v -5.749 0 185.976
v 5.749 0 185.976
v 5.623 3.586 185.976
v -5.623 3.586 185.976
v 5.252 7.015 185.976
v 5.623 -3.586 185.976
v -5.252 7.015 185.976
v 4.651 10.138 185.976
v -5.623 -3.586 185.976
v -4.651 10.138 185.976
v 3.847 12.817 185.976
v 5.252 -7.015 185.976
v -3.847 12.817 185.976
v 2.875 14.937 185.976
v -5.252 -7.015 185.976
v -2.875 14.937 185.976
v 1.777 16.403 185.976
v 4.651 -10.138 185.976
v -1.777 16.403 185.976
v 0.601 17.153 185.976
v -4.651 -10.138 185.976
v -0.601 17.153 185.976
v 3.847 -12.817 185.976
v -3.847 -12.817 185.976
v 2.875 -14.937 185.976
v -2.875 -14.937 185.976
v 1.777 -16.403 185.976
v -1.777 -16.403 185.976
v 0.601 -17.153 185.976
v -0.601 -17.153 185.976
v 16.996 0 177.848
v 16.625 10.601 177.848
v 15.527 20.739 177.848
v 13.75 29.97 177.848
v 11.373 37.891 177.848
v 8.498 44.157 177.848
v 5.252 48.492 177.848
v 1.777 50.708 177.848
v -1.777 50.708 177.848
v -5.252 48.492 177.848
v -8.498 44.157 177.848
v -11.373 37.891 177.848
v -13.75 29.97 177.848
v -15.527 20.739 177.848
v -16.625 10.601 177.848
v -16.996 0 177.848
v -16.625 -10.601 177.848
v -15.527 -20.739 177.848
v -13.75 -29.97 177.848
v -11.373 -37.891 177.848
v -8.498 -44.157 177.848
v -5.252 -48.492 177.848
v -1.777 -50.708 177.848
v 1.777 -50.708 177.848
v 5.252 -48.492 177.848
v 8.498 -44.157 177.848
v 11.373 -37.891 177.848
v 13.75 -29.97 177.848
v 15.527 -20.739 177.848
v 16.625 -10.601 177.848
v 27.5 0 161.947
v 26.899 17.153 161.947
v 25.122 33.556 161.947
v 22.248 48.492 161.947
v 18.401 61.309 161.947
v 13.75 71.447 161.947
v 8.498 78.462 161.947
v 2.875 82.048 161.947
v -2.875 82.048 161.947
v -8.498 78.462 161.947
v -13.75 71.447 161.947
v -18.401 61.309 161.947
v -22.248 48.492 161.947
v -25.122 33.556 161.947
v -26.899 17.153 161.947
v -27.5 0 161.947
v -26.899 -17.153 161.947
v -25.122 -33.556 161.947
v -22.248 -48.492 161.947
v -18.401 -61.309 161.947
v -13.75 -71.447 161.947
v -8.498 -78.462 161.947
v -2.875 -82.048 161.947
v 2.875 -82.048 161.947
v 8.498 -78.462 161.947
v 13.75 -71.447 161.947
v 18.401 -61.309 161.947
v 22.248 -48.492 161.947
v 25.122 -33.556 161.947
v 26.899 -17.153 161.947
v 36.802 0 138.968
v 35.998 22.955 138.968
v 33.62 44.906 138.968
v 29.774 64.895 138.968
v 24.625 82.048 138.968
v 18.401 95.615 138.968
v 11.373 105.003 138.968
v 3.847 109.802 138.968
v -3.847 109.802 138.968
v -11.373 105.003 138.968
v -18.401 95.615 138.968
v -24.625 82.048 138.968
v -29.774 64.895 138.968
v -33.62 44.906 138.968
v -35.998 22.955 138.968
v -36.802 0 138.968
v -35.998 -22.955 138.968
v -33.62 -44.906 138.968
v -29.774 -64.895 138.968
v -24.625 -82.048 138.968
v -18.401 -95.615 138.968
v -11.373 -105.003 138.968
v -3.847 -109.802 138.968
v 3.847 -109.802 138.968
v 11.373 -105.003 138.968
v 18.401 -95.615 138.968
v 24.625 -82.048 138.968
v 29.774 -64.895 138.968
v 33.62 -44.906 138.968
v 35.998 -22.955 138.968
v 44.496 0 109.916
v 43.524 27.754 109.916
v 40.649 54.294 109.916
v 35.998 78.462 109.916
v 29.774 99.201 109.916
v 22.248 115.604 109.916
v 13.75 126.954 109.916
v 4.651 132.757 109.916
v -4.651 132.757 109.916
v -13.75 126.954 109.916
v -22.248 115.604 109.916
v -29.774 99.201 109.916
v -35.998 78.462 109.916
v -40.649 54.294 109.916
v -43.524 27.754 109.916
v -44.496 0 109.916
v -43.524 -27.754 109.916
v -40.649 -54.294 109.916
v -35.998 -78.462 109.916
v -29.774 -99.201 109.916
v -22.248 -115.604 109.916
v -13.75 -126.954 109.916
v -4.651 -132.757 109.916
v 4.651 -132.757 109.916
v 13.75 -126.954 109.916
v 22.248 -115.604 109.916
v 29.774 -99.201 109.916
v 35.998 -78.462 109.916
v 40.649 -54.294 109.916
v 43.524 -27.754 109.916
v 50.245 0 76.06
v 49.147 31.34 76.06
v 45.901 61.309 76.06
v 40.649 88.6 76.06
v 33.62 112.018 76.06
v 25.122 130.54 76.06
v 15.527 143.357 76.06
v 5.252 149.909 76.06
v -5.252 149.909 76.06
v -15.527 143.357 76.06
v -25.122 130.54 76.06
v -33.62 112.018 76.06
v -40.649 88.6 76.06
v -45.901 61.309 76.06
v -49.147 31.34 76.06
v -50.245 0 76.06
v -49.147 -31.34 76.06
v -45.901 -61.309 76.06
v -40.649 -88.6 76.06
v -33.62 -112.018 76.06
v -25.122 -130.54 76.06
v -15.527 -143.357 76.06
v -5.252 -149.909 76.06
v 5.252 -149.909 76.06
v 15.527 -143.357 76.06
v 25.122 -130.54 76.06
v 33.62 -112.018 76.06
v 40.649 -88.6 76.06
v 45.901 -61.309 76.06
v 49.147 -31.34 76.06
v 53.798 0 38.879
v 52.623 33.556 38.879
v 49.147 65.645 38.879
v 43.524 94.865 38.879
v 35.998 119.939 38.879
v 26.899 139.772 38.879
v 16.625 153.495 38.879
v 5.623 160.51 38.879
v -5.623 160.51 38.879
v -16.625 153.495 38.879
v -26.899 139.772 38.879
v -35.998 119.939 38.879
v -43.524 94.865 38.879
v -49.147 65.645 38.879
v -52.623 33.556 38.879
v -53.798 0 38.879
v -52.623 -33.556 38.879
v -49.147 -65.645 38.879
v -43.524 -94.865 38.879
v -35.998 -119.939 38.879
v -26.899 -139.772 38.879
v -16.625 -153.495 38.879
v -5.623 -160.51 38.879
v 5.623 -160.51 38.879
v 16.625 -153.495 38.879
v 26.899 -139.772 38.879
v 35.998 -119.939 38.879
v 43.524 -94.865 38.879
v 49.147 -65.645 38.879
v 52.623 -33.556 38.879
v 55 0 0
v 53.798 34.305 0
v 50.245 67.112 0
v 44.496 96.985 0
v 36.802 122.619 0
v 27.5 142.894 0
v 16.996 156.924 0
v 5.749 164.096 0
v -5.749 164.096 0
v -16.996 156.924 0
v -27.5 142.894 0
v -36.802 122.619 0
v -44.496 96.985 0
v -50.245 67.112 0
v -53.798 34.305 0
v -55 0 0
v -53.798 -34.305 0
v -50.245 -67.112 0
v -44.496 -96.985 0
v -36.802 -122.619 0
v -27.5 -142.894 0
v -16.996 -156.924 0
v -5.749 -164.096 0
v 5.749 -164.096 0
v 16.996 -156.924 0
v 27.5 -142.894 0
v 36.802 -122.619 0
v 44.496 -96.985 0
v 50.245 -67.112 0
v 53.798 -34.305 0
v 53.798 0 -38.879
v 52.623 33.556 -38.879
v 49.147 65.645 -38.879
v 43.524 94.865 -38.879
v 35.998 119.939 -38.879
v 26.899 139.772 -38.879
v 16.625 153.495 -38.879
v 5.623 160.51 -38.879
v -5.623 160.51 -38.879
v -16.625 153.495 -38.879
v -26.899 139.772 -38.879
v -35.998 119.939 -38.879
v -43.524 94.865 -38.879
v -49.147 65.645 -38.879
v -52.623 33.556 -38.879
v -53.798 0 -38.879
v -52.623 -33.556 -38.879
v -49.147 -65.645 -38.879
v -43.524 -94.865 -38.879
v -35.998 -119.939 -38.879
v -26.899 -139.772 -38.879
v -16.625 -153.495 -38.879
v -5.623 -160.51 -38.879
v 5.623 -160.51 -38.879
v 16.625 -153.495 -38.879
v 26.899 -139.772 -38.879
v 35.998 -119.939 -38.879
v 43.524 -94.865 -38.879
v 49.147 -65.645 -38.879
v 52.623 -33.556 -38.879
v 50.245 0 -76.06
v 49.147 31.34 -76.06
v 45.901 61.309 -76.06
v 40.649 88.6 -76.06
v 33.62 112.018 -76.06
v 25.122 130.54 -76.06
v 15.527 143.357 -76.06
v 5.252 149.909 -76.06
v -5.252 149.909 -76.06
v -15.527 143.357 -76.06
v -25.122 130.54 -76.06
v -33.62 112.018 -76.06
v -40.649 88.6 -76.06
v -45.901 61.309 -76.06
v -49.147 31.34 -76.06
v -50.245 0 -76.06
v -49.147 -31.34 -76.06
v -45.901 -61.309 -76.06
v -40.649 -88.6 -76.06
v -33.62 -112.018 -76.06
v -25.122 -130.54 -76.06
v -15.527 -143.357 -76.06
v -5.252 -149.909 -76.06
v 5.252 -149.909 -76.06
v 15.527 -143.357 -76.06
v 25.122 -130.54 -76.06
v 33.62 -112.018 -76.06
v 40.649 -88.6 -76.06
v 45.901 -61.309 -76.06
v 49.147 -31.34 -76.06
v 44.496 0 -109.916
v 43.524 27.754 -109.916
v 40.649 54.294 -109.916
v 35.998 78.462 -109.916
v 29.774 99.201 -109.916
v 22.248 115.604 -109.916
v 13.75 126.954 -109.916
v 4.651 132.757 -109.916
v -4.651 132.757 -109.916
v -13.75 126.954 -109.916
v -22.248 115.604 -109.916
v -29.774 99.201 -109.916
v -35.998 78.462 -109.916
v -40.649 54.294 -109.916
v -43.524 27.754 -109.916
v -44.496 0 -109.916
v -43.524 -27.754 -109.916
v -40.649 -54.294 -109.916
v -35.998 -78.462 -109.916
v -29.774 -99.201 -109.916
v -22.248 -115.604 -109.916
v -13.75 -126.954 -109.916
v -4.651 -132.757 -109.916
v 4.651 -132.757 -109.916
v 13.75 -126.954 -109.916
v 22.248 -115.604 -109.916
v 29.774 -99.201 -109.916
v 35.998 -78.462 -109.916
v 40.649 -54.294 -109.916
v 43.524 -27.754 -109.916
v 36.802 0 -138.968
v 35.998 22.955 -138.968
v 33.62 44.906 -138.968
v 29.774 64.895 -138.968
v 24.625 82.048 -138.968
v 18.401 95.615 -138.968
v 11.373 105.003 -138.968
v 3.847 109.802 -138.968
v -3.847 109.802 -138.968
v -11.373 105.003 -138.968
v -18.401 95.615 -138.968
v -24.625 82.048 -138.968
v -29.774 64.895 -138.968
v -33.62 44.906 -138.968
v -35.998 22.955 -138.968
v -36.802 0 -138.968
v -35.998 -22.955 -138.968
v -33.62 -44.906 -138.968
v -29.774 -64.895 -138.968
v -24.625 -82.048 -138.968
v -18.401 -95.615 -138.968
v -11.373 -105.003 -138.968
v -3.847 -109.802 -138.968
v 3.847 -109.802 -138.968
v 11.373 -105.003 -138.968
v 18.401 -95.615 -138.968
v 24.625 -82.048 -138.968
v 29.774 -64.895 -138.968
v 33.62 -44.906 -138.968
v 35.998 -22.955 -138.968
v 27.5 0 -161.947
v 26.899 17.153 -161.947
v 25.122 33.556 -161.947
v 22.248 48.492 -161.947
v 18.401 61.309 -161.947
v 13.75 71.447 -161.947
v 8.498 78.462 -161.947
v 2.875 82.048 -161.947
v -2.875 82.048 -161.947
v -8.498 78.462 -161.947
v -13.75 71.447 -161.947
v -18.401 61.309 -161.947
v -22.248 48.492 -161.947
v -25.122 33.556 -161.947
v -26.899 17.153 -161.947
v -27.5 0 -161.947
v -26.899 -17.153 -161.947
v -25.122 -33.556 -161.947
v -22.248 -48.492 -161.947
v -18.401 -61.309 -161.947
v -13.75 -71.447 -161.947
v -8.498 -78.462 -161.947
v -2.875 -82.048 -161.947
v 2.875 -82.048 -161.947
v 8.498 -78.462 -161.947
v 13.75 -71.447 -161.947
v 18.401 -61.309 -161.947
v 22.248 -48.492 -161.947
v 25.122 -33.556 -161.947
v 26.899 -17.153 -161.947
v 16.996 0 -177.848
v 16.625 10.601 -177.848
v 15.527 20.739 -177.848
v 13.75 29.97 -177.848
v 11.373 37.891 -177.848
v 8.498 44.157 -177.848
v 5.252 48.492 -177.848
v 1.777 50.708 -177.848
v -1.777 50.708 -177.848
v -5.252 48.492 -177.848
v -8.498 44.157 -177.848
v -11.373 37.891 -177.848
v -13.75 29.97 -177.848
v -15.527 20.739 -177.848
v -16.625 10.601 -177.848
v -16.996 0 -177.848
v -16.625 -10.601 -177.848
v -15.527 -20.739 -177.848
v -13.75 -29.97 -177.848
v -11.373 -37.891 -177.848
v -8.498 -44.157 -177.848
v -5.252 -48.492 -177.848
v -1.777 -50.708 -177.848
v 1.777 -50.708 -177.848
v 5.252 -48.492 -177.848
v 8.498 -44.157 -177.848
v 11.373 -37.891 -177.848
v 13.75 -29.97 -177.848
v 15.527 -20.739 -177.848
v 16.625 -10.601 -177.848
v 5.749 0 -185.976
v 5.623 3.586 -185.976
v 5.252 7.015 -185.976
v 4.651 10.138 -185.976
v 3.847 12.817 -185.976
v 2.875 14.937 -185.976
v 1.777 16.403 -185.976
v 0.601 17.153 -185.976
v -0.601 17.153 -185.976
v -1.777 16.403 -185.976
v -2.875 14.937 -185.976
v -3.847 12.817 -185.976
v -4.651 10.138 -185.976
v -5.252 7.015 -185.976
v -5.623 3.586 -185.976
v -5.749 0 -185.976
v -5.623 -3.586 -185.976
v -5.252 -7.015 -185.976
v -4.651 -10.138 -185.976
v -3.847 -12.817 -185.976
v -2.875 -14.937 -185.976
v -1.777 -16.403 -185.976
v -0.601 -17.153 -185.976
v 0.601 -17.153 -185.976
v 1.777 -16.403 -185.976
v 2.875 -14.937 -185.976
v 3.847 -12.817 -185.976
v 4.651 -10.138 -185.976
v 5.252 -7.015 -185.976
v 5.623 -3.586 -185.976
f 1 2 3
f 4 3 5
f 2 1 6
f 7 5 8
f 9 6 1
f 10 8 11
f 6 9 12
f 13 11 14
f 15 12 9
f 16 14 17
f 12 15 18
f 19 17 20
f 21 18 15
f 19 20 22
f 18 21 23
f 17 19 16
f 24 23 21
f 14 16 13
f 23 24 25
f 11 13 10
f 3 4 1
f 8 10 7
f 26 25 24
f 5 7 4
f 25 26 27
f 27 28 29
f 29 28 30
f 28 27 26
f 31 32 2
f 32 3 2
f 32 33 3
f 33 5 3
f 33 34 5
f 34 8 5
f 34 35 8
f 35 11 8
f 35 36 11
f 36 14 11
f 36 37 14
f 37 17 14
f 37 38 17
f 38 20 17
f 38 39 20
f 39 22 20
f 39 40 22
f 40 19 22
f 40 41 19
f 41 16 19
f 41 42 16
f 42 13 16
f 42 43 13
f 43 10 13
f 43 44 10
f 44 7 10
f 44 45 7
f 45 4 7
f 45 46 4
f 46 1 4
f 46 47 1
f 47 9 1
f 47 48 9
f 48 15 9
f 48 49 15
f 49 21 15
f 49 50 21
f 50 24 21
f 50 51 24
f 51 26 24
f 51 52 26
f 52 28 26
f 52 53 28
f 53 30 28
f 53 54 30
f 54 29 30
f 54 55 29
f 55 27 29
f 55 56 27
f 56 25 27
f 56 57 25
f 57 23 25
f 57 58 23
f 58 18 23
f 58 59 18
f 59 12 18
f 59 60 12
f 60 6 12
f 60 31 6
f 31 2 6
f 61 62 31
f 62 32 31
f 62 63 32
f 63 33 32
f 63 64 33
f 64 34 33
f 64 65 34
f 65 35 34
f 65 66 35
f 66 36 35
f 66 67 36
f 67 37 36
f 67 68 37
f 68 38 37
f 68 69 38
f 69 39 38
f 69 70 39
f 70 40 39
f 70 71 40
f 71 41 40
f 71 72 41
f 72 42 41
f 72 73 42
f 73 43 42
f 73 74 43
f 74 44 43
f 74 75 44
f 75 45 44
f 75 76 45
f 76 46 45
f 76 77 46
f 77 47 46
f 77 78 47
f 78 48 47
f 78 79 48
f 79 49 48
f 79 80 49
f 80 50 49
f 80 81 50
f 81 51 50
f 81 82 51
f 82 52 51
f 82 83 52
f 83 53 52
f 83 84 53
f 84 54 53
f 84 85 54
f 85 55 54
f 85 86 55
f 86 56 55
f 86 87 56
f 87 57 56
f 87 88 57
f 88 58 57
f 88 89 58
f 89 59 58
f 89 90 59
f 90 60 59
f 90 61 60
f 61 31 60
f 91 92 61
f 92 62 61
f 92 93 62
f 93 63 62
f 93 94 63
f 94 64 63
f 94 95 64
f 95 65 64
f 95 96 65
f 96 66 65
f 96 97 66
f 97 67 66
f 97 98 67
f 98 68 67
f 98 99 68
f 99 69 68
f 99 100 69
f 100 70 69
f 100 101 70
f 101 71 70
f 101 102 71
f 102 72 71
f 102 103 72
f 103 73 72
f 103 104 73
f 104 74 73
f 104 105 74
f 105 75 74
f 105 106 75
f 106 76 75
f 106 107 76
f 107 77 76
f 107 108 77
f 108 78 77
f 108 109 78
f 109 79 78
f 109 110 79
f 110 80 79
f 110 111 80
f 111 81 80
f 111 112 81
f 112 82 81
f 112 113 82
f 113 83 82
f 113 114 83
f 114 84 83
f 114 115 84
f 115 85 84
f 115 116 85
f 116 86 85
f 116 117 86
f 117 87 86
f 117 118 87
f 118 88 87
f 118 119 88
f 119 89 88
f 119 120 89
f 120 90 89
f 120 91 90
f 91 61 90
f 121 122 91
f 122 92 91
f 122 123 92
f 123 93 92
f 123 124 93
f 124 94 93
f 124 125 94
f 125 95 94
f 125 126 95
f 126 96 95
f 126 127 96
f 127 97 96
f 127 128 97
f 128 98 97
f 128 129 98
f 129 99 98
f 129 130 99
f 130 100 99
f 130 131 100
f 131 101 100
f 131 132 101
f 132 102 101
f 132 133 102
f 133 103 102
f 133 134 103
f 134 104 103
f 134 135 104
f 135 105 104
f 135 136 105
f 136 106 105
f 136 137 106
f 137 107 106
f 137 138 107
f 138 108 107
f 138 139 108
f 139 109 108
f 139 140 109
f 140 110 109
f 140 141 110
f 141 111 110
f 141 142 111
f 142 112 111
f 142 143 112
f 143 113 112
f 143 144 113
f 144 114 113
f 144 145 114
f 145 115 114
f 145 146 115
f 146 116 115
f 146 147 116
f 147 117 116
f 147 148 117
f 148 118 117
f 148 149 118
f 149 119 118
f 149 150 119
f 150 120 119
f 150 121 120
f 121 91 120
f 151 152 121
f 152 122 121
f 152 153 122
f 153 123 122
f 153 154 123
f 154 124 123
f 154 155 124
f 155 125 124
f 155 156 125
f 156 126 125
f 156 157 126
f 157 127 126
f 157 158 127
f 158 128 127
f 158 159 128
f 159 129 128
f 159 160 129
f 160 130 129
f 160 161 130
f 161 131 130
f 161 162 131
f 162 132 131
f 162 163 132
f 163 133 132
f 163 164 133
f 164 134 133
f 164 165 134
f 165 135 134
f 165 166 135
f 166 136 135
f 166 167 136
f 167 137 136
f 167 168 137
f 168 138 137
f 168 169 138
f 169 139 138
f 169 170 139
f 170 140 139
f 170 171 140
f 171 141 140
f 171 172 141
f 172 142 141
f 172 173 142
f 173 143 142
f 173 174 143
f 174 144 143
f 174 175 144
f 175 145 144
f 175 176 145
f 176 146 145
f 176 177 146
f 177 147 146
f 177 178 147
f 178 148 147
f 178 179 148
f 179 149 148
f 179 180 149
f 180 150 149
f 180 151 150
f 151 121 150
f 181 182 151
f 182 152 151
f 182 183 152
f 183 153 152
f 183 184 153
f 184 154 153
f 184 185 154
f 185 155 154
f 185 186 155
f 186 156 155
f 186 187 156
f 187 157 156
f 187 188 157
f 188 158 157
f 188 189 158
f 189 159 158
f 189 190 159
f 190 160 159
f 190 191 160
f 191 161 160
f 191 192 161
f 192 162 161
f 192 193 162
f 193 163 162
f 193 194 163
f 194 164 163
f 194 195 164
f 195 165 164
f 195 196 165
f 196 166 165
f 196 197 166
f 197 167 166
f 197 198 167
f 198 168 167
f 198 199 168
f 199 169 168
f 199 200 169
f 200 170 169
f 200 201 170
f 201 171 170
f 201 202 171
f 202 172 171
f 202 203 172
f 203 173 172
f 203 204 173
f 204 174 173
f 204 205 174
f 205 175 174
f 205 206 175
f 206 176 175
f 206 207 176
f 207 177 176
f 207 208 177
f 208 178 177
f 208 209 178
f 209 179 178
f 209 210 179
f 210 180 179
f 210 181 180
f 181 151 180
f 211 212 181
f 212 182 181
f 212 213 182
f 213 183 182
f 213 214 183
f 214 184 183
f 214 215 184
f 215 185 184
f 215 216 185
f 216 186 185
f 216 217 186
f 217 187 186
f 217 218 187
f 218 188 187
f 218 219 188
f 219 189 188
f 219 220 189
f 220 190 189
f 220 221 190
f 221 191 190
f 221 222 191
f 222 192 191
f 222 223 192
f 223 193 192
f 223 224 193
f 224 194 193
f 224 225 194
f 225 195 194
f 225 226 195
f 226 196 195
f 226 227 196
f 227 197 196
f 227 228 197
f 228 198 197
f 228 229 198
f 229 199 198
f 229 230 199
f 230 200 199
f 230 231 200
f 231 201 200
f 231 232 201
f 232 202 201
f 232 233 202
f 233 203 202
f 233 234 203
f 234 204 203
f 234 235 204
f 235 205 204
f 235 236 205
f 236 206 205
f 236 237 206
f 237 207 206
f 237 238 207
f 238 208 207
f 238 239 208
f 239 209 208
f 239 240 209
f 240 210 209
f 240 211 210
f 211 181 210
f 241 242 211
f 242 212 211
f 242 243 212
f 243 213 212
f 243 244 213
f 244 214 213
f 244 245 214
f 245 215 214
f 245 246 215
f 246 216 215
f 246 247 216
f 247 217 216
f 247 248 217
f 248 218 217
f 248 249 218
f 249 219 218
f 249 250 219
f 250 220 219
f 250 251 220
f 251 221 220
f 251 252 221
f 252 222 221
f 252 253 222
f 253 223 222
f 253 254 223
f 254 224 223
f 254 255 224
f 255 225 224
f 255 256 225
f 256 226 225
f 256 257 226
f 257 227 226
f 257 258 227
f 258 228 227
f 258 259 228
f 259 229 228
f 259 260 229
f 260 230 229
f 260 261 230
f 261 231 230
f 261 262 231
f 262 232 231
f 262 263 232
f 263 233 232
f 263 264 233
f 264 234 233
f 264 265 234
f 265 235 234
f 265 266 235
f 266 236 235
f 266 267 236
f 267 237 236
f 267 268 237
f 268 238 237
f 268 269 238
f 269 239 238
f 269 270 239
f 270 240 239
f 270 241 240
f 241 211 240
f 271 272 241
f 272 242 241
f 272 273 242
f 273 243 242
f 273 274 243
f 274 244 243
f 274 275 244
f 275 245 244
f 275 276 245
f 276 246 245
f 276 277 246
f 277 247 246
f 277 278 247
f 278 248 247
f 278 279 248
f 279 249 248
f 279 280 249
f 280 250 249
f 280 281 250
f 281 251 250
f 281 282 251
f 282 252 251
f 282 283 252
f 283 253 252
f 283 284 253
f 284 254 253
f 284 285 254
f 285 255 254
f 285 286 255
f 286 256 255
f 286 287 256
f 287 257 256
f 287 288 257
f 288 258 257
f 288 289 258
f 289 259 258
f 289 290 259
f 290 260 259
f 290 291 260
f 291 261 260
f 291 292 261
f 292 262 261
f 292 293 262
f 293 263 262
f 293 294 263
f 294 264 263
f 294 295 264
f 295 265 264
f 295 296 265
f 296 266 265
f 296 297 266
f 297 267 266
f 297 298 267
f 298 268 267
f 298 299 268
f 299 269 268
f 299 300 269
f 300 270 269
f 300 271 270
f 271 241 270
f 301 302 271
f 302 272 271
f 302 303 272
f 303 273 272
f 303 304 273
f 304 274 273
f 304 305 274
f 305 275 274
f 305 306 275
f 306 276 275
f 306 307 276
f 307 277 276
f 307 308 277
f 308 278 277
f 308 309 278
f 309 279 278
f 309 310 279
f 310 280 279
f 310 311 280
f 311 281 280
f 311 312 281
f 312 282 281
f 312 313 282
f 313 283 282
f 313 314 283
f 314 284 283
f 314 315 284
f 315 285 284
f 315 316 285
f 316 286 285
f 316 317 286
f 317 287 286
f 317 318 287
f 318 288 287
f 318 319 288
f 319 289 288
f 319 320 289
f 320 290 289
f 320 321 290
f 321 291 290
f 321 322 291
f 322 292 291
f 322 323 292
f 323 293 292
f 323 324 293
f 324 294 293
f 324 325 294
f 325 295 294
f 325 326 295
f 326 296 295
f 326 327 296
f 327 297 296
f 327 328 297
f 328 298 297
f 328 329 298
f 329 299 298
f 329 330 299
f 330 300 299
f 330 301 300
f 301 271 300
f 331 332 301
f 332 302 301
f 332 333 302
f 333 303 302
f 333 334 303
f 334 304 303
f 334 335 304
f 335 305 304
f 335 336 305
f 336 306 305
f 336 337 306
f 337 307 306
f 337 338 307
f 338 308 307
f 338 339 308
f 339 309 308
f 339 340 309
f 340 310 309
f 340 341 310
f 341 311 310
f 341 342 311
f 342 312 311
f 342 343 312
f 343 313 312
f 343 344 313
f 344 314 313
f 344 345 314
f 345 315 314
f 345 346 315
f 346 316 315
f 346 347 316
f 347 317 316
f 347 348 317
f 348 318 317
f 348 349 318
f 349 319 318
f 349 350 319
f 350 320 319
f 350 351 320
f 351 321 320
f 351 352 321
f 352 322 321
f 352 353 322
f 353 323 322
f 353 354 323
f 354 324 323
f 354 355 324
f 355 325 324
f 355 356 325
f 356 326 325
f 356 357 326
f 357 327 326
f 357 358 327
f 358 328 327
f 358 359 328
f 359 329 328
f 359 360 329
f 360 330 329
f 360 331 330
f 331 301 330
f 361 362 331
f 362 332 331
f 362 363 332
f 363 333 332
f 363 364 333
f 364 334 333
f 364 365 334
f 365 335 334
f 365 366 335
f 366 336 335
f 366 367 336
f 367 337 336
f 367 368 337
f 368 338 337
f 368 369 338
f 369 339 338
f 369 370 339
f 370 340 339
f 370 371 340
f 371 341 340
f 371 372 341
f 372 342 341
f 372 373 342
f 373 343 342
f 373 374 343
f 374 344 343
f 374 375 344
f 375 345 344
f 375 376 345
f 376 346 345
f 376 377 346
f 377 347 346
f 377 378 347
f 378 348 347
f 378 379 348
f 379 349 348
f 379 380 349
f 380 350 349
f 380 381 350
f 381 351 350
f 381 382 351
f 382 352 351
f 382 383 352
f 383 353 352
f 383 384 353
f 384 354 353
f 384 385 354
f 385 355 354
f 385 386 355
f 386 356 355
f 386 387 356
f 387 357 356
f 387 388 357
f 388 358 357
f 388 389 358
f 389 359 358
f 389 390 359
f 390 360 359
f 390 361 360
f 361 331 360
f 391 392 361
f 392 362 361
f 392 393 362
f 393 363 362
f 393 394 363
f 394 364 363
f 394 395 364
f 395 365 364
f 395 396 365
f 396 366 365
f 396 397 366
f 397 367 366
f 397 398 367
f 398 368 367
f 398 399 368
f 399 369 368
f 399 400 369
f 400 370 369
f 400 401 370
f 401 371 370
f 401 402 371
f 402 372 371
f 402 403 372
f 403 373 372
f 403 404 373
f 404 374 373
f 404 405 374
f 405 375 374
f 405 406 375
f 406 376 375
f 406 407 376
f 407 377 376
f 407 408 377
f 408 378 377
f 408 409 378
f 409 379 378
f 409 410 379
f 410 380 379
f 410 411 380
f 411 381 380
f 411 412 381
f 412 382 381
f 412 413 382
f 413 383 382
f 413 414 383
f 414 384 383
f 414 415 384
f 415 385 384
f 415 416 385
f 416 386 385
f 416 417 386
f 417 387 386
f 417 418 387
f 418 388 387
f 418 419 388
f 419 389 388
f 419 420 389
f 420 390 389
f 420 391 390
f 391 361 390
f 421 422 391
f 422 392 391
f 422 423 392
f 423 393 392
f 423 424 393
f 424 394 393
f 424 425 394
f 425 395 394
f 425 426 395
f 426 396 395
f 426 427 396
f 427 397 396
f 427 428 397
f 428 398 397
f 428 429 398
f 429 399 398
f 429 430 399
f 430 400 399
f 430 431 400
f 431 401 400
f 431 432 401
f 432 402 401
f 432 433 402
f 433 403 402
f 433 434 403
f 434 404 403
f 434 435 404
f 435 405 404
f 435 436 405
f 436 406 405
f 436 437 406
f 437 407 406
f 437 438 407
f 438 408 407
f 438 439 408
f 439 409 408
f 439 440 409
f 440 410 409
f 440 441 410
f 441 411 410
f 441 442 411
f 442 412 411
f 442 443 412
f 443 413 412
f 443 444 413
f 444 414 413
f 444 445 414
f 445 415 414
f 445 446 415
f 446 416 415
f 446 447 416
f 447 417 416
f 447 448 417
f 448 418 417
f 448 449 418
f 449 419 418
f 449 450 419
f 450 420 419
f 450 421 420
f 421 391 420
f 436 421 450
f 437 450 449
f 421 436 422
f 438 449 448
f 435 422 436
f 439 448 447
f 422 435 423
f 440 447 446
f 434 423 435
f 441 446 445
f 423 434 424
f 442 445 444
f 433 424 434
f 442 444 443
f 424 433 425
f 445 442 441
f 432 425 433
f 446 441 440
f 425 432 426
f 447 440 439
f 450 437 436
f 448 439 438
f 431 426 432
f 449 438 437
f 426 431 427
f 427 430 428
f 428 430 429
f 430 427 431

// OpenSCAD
// Generated by SolidPython 1.0.1 on 2020-07-29 00:46:46


scale(v = [5, 15, 17]) {
	sphere(r = 11);
}
/***********************************************
*********      SolidPython code:      **********
************************************************
 
# import packages: SolidPython
from solid import *
from solid.utils import *
from itertools import chain, combinations, permutations


class Resize:

    def __init__(self, scad_file):
        self.scad_file = scad_file
        #self.scad_file = import_scad(scad_file)
        # cone/cylinder param:
        self.r1 = 0
        self.r2 = 0
        self.h = 0
        # rectangular prism param:
        self.w = 0
        self.l = 0
        # ellipse param:
        self.r = 0

    # import OpenScad code (file name corresponds to shape)


    # classify shape + parameters
    def assign(self, param1, param2, param3):
        if self.scad_file == 'cone.scad':
            self.r1 = param1
            self.r2 = param2
            self.h = param3
        elif self.scad_file == 'cylinder.scad':
            self.r1 = param1
            self.r2 = param2
            self.h = param3
        elif self.scad_file == 'rectangularPrism.scad':
            self.h = param1
            self.l = param2
            self.w = param3
        else:
            self.r = param1
            self.h = param2

    # resize parameters
    def iterate(self):
        x = range(3, 20, 2)
        i = 1
        if self.scad_file == 'cone.scad':
            tempList = list(permutations(x, 2))
            for temp in tempList:
                param1 = temp[0]
                param2 = temp[1]
                filepath = 'produced_scad_files/' + 'cone' + str(param1) + '_' + str(param2) + '_' + '.scad'
                scad_render_to_file(cylinder(h=param1, r1=param2, r2=0), filepath)

        elif self.scad_file == 'cylinder.scad':
            tempList = list(permutations(x, 3))
            for temp in tempList:
                param1 = temp[0]
                param2 = temp[1]
                filepath = 'produced_scad_files/' + 'cylinder' + str(param1) + '_' + str(param2) + '_' + '.scad'
                scad_render_to_file(cylinder(h=param1, r1=param2, r2=param2), filepath)

        elif self.scad_file == 'rectangularPrism.scad':
            tempList = list(permutations(x, 3))
            for temp in tempList:
                param1 = temp[0]
                param2 = temp[1]
                param3 = temp[2]
                filepath = 'produced_scad_files/' + 'rectangularPrism' + str(param1) + '_' + str(param2) + '_' + str(
                    param3) + '.scad'
                scad_render_to_file(cube(size=(param1, param2, param3)), filepath)

        elif self.scad_file == 'ellipse.scad':
            tempList = list(permutations(x, 4))
            for temp in tempList:
                param1 = temp[0]
                param2 = temp[1]
                param3 = temp[2]
                param4 = temp[3]
                filepath = 'produced_scad_files/' + 'ellipse' + str(param1) + '_' + str(param2) + '_' + str(param3) + '_' + str(param4) + '.scad'
                scad_render_to_file(scale([param1, param2, param3])(sphere(r=param4)), filepath)

    def render_to_scadfile(self):
        scad_render_to_file(scad, 'example.scad') 
 
************************************************/
